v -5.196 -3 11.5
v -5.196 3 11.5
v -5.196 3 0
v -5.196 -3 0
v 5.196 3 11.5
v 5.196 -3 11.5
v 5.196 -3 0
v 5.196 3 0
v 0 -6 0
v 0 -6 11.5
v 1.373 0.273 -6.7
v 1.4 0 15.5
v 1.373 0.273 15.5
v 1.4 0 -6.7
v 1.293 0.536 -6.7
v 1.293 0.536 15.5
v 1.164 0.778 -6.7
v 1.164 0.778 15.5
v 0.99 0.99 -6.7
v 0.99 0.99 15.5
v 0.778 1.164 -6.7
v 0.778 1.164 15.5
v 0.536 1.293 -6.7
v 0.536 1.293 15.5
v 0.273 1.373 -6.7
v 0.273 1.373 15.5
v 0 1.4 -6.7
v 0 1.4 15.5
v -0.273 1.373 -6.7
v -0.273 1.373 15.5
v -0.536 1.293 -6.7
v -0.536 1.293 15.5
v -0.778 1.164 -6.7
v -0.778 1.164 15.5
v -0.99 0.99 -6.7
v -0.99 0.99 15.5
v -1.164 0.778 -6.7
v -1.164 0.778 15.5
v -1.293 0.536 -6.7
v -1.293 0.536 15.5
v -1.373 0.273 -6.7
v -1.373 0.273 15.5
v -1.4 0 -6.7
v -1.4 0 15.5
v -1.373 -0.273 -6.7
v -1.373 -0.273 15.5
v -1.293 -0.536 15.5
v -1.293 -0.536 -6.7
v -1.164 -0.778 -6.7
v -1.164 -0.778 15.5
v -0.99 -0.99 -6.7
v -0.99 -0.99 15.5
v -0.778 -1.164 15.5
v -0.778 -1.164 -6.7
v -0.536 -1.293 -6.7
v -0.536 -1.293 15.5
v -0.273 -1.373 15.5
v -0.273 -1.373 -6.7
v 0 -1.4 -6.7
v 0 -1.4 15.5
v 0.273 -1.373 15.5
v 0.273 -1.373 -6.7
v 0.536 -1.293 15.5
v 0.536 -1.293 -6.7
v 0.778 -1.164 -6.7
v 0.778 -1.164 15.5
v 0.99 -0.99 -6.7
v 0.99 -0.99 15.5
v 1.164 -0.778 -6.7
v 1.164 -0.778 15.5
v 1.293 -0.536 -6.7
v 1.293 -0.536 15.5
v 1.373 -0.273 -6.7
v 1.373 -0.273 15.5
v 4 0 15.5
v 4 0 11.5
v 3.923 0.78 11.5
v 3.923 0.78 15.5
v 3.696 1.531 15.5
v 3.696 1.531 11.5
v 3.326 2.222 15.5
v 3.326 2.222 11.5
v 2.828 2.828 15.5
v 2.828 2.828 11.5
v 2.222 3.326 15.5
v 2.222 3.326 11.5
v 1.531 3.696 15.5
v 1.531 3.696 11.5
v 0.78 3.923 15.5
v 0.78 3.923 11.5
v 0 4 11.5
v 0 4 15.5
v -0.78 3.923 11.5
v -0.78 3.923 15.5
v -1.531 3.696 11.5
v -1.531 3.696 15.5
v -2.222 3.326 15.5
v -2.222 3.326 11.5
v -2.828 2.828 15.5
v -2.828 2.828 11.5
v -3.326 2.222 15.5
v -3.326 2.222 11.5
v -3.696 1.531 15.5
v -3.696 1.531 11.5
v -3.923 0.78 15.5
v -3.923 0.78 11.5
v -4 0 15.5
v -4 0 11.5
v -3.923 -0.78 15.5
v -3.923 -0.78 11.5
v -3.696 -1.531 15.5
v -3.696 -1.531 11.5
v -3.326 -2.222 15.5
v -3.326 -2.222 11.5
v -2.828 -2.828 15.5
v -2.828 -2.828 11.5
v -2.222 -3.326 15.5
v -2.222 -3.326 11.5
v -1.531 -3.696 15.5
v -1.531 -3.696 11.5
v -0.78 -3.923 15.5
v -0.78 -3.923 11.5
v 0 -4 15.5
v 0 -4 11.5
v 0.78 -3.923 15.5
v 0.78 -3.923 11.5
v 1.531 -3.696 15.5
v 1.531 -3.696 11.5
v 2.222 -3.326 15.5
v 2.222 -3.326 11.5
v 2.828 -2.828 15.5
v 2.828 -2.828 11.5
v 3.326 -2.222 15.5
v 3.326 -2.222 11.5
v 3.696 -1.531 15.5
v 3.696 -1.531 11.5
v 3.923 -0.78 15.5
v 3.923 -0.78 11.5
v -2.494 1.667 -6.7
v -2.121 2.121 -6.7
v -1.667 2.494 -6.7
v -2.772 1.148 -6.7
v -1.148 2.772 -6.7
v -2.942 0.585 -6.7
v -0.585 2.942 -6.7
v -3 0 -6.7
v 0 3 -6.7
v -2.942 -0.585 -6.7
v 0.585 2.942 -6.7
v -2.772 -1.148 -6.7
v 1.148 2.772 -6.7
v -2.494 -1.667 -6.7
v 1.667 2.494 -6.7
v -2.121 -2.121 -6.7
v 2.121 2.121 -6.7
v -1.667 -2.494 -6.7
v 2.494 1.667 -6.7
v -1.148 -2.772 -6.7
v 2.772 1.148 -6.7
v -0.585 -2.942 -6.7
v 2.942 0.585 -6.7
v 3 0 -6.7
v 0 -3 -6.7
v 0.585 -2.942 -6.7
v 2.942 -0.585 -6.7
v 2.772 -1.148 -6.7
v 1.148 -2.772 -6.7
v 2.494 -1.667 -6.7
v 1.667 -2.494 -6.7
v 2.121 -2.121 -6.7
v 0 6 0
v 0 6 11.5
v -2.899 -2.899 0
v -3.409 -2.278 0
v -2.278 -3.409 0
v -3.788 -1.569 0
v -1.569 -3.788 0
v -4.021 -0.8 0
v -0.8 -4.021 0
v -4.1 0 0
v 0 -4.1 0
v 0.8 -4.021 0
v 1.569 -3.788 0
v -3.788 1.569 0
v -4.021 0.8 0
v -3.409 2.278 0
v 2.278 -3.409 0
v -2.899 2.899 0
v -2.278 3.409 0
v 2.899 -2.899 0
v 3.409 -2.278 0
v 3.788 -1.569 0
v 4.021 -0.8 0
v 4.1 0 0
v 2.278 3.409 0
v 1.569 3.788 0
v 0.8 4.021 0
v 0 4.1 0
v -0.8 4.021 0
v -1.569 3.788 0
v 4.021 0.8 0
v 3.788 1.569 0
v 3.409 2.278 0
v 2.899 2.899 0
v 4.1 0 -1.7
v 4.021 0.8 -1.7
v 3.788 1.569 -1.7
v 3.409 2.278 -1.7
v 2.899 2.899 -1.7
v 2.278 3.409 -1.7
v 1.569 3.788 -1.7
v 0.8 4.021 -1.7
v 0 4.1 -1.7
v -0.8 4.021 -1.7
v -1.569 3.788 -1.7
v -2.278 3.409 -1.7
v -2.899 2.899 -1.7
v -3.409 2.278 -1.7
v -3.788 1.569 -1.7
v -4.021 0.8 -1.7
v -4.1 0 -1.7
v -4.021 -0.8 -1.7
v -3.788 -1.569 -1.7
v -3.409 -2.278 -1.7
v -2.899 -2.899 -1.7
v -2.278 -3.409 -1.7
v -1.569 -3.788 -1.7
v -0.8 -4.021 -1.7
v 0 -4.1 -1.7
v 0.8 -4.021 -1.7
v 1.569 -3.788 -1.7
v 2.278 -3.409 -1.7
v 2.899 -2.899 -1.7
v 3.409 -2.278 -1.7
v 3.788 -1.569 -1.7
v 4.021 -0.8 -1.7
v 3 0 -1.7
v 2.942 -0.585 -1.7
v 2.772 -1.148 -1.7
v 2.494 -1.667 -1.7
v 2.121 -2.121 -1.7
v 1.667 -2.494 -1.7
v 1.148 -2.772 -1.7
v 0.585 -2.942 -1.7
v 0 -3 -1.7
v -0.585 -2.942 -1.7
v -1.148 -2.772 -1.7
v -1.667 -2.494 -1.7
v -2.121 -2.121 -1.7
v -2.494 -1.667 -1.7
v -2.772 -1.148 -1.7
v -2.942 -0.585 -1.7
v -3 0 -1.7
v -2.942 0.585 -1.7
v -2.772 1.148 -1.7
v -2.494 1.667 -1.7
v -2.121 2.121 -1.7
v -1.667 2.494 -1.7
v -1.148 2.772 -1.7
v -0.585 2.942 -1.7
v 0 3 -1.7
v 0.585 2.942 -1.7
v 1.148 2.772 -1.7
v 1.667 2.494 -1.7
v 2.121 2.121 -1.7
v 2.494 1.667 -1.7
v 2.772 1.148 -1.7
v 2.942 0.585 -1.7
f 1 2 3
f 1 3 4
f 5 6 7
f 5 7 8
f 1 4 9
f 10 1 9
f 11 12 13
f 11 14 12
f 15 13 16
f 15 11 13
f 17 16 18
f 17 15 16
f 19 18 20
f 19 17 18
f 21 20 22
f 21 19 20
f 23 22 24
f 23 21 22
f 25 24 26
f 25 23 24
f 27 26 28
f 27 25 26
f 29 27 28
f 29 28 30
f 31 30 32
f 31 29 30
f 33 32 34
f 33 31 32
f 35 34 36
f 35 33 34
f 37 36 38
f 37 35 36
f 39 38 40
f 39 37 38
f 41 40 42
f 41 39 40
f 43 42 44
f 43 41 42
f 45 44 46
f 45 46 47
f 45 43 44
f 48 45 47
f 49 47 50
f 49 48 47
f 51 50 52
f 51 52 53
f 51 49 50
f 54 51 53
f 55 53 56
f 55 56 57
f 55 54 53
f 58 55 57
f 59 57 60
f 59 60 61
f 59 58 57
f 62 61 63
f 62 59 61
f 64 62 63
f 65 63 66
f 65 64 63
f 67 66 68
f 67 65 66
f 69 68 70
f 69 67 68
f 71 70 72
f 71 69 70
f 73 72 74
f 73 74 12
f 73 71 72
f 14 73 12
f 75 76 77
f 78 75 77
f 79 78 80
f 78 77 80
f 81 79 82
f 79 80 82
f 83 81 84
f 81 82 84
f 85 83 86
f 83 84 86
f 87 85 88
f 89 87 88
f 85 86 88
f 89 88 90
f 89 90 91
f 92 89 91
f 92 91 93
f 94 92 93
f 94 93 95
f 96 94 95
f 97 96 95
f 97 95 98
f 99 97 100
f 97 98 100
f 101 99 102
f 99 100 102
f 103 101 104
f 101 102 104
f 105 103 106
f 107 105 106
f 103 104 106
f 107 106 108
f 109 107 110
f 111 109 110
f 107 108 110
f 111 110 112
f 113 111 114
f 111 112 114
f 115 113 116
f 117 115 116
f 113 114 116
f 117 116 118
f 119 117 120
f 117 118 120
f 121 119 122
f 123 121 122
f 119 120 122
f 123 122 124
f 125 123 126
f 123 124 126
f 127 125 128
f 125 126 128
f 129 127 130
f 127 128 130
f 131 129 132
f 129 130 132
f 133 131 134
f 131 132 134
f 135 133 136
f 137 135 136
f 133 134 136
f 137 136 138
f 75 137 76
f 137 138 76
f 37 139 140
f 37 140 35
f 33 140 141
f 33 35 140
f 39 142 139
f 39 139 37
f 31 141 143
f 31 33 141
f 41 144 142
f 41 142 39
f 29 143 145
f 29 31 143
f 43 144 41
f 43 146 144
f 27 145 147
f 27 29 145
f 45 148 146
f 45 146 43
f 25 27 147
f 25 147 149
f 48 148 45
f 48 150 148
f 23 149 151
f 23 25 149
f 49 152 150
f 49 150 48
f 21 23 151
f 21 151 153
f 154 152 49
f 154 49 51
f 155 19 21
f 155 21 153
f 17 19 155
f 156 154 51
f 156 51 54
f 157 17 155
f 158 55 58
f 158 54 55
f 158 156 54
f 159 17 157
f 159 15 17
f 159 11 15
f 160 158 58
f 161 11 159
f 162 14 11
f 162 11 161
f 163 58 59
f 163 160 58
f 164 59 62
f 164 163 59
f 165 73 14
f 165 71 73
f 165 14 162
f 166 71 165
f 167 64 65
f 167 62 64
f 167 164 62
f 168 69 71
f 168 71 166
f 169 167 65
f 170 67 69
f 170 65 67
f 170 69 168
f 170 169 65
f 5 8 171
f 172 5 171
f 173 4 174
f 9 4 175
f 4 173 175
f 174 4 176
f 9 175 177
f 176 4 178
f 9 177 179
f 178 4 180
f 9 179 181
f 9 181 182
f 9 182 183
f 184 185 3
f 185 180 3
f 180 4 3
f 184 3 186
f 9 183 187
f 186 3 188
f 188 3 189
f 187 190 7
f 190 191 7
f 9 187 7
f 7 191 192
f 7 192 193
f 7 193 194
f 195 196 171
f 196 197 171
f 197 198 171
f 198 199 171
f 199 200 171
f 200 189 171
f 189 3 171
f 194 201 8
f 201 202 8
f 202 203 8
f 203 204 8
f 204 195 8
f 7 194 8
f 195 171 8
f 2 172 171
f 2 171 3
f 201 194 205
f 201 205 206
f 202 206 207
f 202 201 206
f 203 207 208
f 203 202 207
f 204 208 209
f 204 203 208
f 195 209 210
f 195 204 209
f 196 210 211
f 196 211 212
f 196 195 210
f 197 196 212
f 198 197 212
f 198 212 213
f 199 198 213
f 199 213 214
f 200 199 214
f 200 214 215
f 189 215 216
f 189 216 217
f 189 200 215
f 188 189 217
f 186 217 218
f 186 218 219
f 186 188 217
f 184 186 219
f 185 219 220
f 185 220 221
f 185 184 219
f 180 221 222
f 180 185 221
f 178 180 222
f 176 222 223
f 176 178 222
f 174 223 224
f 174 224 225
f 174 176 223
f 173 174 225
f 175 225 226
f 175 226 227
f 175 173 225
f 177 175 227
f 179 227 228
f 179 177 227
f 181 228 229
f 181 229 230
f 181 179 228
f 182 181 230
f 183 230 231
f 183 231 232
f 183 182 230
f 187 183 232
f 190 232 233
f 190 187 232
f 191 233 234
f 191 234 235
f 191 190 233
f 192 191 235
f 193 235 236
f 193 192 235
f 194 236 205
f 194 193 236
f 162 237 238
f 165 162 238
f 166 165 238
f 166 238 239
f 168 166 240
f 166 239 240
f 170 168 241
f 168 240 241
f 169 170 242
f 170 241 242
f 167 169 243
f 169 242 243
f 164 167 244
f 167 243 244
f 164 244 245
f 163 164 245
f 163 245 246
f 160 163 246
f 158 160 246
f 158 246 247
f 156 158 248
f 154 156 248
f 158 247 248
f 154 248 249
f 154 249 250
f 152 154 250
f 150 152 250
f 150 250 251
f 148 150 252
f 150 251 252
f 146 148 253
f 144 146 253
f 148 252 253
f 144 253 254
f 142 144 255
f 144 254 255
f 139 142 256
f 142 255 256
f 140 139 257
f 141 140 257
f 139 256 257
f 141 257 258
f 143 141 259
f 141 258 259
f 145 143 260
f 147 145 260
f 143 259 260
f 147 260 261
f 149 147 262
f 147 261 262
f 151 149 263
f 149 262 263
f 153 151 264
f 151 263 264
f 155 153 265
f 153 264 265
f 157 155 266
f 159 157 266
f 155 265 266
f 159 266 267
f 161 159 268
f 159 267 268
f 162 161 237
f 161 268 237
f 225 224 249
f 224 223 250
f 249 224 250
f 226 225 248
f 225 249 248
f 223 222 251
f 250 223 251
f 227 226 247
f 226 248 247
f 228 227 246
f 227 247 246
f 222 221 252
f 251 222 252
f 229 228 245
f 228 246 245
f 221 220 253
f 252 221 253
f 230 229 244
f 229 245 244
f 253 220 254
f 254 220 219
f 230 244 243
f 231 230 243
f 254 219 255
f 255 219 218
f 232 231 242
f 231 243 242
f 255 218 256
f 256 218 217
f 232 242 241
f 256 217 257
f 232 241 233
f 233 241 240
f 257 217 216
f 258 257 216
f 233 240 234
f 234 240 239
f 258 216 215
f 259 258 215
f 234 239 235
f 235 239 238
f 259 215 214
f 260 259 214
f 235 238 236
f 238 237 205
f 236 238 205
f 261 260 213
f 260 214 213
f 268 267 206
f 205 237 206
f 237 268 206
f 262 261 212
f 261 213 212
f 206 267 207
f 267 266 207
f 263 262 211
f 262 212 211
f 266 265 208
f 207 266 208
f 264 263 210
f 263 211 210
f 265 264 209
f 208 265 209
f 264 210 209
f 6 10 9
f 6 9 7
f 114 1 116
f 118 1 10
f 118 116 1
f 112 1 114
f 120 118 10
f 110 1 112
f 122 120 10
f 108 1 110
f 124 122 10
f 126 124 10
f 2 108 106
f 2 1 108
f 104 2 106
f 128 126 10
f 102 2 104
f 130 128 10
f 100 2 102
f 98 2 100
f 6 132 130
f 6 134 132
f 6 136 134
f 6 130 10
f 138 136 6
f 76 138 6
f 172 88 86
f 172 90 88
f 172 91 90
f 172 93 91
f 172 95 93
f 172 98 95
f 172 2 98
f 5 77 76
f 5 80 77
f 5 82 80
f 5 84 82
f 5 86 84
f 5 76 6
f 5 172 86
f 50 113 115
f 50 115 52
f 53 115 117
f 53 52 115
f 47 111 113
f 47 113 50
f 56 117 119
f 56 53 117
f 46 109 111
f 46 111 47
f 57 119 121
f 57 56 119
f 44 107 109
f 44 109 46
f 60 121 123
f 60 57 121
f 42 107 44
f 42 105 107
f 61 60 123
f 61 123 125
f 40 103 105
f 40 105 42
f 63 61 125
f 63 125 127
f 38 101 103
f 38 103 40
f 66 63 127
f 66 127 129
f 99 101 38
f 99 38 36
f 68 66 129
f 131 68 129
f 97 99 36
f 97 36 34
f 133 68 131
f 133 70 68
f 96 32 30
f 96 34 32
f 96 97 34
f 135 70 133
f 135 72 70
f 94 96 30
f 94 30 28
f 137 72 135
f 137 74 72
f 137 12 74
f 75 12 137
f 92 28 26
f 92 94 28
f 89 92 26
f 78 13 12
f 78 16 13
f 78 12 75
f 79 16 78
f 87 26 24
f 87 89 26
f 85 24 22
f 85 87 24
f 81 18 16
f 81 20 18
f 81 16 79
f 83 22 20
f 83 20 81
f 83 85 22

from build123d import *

# Parameters (mm, degrees)
F0_R     = 4.1
F0_R_2   = 1.4
F1_DEPTH = 1.7
F2_R     = 3
F2_R_2   = 1.4
F3_DEPTH = 5
F4_DEPTH = 11.5
F5_R     = 4
F5_R_2   = 1.4
F6_DEPTH = 4


with BuildPart() as f1:
    # F0 (on Top) → F1 (new body)
    with BuildSketch(Plane.XY):
        Circle(F0_R)
        Circle(F0_R_2, mode=Mode.SUBTRACT)
    extrude(amount=-F1_DEPTH)

    # F2 (on face) → F3 (join)
    with BuildSketch(Plane(origin=(0, 0, -1.7), x_dir=(1, 0, 0), z_dir=(0, 0, -1))):
        Circle(F2_R)
        Circle(F2_R_2, mode=Mode.SUBTRACT)
    extrude(amount=F3_DEPTH)

    # F0 (on Top) → F4 (join)
    with BuildSketch(Plane.XY):
        Polygon((5.1961524227, -3), (5.1961524227, 3), (0, 6), (-5.1961524227, 3), (-5.1961524227, -3), (0, -6), align=None)
        Circle(F0_R, mode=Mode.SUBTRACT)
        Circle(F0_R)
        Circle(F0_R_2, mode=Mode.SUBTRACT)
    extrude(amount=F4_DEPTH)

    # F5 (on face) → F6 (join)
    with BuildSketch(Plane.XY.offset(11.5)):
        Circle(F5_R)
        Circle(F5_R_2, mode=Mode.SUBTRACT)
    extrude(amount=F6_DEPTH)


solid = f1.part
